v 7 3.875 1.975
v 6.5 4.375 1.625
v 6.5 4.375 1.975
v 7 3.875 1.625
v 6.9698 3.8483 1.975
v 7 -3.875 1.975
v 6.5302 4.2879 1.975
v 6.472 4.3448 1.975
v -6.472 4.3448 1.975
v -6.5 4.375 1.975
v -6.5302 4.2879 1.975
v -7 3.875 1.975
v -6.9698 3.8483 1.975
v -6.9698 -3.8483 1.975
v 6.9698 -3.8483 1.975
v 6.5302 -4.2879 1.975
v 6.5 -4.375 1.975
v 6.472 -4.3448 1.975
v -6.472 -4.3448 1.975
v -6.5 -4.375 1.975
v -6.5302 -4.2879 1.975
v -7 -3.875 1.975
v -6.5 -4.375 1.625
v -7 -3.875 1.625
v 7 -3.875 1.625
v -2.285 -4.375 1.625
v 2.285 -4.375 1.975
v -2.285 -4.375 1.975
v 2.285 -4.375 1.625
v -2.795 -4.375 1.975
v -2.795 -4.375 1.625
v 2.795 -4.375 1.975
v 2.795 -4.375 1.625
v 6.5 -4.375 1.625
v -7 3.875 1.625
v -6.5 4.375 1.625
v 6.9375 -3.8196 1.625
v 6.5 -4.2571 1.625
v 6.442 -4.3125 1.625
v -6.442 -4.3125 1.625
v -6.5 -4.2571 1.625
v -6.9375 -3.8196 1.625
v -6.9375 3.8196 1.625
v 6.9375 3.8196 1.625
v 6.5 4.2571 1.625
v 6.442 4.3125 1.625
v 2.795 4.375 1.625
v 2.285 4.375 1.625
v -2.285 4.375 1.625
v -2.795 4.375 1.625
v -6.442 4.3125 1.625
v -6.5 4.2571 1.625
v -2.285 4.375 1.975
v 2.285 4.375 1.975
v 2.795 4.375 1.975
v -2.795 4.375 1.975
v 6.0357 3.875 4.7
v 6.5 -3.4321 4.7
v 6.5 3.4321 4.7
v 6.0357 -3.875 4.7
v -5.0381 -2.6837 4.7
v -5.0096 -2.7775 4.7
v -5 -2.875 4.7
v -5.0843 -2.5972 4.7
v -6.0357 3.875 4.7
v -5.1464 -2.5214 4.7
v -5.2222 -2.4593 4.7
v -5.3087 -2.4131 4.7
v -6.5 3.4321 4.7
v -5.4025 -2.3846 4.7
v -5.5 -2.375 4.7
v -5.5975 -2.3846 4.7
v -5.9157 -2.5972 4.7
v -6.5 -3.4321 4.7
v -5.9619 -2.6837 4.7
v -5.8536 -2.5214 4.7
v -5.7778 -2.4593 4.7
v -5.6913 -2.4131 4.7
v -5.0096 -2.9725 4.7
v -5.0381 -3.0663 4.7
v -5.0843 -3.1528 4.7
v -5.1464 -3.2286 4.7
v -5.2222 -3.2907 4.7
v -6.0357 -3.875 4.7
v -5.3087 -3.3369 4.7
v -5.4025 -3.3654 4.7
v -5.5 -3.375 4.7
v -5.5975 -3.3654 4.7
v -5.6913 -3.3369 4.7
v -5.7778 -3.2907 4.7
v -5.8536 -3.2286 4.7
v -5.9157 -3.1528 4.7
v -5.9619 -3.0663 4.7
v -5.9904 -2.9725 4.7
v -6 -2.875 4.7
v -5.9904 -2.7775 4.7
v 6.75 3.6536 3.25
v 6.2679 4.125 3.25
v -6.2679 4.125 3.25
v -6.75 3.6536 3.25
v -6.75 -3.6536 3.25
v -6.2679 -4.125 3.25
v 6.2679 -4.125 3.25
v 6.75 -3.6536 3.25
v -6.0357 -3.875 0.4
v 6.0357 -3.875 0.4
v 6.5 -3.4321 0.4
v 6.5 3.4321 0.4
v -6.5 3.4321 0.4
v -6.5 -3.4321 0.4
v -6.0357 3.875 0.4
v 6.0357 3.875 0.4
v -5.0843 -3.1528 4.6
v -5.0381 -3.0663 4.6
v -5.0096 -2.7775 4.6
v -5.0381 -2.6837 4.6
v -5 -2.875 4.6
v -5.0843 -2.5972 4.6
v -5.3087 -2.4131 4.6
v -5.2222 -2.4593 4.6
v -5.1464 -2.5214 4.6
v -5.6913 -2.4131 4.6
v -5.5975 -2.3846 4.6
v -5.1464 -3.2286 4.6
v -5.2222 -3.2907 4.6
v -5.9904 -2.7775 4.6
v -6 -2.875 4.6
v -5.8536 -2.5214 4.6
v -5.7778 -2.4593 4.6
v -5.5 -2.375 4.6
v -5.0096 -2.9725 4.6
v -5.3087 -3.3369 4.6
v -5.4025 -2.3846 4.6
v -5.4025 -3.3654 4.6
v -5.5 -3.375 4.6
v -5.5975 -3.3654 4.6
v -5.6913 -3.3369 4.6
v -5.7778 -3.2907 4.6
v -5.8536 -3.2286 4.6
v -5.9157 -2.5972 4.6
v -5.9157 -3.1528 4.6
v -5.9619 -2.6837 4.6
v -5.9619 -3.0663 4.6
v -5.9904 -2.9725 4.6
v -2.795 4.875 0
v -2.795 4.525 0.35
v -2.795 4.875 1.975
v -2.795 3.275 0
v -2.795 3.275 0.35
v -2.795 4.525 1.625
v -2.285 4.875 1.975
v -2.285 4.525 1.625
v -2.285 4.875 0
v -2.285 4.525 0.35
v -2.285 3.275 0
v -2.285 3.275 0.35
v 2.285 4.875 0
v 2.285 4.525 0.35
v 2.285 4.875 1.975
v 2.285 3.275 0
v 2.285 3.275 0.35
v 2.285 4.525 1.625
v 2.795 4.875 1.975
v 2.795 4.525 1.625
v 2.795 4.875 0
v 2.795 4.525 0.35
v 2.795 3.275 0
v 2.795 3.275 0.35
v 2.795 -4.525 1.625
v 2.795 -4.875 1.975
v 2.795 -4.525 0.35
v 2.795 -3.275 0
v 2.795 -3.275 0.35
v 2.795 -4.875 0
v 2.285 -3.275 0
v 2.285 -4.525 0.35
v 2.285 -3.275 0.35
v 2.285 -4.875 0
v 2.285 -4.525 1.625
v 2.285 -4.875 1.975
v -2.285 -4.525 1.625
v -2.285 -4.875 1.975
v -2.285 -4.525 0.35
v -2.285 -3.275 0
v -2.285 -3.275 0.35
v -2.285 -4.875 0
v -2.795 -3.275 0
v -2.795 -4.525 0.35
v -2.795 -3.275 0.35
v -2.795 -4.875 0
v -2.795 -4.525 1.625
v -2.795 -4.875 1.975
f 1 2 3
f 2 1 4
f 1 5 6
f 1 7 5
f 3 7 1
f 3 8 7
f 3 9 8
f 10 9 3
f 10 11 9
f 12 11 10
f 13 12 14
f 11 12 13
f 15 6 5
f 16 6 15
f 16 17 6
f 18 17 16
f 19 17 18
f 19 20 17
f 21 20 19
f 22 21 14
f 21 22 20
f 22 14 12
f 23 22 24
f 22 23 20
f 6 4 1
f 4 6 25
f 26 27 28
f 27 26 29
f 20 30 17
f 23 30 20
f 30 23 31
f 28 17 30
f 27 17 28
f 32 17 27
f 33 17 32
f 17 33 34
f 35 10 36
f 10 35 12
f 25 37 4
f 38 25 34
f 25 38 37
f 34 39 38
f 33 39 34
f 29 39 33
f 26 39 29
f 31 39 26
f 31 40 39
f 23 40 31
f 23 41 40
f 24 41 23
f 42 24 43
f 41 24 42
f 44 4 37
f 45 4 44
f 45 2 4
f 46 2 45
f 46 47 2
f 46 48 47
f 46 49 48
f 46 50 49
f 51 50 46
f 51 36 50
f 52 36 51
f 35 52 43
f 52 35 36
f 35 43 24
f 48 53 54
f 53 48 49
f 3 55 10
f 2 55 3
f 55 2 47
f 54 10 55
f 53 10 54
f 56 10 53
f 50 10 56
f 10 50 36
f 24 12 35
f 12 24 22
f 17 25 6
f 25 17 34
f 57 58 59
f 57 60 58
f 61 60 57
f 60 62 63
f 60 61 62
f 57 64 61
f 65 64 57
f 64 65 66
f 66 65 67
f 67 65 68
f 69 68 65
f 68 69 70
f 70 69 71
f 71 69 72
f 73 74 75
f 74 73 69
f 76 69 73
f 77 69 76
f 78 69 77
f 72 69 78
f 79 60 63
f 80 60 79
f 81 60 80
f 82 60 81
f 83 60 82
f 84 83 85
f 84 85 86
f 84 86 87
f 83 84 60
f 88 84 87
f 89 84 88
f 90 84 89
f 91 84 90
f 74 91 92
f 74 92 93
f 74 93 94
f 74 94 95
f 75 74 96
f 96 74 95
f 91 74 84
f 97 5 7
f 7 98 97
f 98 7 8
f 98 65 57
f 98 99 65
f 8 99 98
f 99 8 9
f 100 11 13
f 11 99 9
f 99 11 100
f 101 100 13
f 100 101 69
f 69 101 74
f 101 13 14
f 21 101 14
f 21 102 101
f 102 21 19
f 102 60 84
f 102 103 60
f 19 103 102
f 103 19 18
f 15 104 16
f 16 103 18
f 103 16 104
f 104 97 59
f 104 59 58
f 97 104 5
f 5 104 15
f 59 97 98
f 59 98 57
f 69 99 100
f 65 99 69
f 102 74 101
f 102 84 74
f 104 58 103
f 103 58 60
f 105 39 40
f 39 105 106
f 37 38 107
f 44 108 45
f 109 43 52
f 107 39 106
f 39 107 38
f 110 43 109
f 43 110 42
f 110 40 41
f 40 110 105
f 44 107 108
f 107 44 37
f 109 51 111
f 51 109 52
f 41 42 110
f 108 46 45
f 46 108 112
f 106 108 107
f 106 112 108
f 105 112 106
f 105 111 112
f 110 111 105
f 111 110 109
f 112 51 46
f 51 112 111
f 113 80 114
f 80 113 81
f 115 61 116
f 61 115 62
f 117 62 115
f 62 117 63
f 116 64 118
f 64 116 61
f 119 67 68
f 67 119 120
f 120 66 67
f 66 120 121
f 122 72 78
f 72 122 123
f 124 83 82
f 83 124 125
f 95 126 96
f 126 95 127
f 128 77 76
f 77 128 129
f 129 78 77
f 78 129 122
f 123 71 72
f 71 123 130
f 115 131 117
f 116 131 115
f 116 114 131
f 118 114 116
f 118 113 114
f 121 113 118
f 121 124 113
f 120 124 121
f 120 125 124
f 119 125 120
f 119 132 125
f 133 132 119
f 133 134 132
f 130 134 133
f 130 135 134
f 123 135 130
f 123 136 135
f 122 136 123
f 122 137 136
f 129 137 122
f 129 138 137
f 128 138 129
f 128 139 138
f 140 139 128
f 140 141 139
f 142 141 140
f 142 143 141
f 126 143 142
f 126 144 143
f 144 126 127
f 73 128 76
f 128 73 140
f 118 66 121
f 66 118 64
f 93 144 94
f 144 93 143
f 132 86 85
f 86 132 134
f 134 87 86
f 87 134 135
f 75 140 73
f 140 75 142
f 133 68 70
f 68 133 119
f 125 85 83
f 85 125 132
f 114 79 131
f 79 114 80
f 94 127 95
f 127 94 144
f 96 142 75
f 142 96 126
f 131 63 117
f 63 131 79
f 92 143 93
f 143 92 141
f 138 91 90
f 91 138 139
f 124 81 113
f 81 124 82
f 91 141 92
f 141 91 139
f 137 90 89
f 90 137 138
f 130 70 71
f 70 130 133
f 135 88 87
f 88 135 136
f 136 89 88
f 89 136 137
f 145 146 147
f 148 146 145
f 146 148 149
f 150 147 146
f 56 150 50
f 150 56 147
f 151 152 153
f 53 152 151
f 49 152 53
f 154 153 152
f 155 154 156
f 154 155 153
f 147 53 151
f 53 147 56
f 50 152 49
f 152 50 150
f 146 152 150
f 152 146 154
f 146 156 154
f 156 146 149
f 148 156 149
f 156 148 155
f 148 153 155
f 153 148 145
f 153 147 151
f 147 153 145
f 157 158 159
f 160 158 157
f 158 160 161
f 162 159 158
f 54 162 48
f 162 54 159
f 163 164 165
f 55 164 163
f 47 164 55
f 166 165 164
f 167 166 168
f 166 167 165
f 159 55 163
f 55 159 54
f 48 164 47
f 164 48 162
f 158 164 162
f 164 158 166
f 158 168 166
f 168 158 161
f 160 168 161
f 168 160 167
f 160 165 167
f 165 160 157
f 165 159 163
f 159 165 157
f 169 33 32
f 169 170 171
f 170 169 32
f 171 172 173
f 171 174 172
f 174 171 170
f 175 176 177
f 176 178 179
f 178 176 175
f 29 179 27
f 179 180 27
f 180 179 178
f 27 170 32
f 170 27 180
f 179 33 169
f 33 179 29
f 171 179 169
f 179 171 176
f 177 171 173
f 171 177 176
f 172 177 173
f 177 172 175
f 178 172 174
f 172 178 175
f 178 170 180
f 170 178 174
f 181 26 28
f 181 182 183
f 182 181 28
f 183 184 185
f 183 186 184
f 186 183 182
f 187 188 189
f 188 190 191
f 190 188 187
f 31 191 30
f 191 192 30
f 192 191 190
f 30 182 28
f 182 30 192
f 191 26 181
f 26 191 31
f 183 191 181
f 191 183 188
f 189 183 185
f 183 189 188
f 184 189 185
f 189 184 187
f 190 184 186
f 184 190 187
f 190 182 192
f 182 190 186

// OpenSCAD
pins = 4;
pin_pitch = 5.08;
pin_width = 0.51;
pin_seating = 1.6;
leadframe_thickness = 0.35;

overall_width = 9.75;
body_width = 8.75;
body_length = 14;
body_thickness_lower = 1.4;
body_thickness_upper = 2.9;

total_thickness = 4.7;

body_length_bevel = 1.0;
body_width_bevel = 1.0;
body_chamfer = 0.5;


leadframe_height = total_thickness - body_thickness_upper;

index_mark_offset = min(min(body_width, body_length) * 0.4, 1.5);
index_mark_radius = min(index_mark_offset / 3, 0.5);


difference() {
    body();
    color("#ddd") translate([
        -body_length / 2 + index_mark_offset,
        -body_width / 2 + index_mark_offset,
        total_thickness - 0.1,
    ]) cylinder(h = 10, r = index_mark_radius, $fn=32);
}


translate([pin_pitch * ((pins / 2) - 1) / -2, overall_width / 2, 0]) for(n = [0 : pins / 2 - 1]) {
    translate([pin_pitch * n, 0, 0]) pin();
}
rotate([0, 0, 180]) translate([pin_pitch * ((pins / 2) - 1) / -2, overall_width / 2, 0]) for(n = [0 : pins / 2 - 1]) {
    translate([pin_pitch * n, 0, 0]) pin();
}


module pin() {
    color("#999") rotate([90, 0, 90]) linear_extrude(height = pin_width, center = true) {
        pin_length = (overall_width - body_width) / 2;
        polygon([
            [-pin_seating, 0],
            [0, 0],
            [0,           leadframe_height + leadframe_thickness/2],
            [-pin_length, leadframe_height + leadframe_thickness/2],
            [-pin_length, leadframe_height - leadframe_thickness/2],
            [-leadframe_thickness, leadframe_height - leadframe_thickness/2],
            [-leadframe_thickness, leadframe_thickness],
            [-pin_seating, leadframe_thickness],
        ]);
    }
}


module body() {
    color("#555") translate([0, 0, leadframe_height]) {
        linear_extrude(height = leadframe_thickness, center = true) body_outline();
        linear_extrude(
            height = body_thickness_upper,
            scale = [(body_length - body_length_bevel) / body_length, (body_width - body_width_bevel) / body_width]
        ) body_outline();
        
        rotate([180, 0, 0]) linear_extrude(
            height = body_thickness_lower,
            scale = [(body_length - body_length_bevel) / body_length, (body_width - body_width_bevel) / body_width]
        ) body_outline();
    }
}
module body_outline() {
    polygon([
        [ -body_length/2 + body_chamfer, -body_width/2 ],
        [ -body_length/2               , -body_width/2 + body_chamfer ],
        [ -body_length/2               , +body_width/2 - body_chamfer ],
        [ -body_length/2 + body_chamfer, +body_width/2 ],
        [ +body_length/2 - body_chamfer, +body_width/2 ],
        [ +body_length/2               , +body_width/2 - body_chamfer ],
        [ +body_length/2               , -body_width/2 + body_chamfer ],
        [ +body_length/2 - body_chamfer, -body_width/2 ],
    ]);
}
